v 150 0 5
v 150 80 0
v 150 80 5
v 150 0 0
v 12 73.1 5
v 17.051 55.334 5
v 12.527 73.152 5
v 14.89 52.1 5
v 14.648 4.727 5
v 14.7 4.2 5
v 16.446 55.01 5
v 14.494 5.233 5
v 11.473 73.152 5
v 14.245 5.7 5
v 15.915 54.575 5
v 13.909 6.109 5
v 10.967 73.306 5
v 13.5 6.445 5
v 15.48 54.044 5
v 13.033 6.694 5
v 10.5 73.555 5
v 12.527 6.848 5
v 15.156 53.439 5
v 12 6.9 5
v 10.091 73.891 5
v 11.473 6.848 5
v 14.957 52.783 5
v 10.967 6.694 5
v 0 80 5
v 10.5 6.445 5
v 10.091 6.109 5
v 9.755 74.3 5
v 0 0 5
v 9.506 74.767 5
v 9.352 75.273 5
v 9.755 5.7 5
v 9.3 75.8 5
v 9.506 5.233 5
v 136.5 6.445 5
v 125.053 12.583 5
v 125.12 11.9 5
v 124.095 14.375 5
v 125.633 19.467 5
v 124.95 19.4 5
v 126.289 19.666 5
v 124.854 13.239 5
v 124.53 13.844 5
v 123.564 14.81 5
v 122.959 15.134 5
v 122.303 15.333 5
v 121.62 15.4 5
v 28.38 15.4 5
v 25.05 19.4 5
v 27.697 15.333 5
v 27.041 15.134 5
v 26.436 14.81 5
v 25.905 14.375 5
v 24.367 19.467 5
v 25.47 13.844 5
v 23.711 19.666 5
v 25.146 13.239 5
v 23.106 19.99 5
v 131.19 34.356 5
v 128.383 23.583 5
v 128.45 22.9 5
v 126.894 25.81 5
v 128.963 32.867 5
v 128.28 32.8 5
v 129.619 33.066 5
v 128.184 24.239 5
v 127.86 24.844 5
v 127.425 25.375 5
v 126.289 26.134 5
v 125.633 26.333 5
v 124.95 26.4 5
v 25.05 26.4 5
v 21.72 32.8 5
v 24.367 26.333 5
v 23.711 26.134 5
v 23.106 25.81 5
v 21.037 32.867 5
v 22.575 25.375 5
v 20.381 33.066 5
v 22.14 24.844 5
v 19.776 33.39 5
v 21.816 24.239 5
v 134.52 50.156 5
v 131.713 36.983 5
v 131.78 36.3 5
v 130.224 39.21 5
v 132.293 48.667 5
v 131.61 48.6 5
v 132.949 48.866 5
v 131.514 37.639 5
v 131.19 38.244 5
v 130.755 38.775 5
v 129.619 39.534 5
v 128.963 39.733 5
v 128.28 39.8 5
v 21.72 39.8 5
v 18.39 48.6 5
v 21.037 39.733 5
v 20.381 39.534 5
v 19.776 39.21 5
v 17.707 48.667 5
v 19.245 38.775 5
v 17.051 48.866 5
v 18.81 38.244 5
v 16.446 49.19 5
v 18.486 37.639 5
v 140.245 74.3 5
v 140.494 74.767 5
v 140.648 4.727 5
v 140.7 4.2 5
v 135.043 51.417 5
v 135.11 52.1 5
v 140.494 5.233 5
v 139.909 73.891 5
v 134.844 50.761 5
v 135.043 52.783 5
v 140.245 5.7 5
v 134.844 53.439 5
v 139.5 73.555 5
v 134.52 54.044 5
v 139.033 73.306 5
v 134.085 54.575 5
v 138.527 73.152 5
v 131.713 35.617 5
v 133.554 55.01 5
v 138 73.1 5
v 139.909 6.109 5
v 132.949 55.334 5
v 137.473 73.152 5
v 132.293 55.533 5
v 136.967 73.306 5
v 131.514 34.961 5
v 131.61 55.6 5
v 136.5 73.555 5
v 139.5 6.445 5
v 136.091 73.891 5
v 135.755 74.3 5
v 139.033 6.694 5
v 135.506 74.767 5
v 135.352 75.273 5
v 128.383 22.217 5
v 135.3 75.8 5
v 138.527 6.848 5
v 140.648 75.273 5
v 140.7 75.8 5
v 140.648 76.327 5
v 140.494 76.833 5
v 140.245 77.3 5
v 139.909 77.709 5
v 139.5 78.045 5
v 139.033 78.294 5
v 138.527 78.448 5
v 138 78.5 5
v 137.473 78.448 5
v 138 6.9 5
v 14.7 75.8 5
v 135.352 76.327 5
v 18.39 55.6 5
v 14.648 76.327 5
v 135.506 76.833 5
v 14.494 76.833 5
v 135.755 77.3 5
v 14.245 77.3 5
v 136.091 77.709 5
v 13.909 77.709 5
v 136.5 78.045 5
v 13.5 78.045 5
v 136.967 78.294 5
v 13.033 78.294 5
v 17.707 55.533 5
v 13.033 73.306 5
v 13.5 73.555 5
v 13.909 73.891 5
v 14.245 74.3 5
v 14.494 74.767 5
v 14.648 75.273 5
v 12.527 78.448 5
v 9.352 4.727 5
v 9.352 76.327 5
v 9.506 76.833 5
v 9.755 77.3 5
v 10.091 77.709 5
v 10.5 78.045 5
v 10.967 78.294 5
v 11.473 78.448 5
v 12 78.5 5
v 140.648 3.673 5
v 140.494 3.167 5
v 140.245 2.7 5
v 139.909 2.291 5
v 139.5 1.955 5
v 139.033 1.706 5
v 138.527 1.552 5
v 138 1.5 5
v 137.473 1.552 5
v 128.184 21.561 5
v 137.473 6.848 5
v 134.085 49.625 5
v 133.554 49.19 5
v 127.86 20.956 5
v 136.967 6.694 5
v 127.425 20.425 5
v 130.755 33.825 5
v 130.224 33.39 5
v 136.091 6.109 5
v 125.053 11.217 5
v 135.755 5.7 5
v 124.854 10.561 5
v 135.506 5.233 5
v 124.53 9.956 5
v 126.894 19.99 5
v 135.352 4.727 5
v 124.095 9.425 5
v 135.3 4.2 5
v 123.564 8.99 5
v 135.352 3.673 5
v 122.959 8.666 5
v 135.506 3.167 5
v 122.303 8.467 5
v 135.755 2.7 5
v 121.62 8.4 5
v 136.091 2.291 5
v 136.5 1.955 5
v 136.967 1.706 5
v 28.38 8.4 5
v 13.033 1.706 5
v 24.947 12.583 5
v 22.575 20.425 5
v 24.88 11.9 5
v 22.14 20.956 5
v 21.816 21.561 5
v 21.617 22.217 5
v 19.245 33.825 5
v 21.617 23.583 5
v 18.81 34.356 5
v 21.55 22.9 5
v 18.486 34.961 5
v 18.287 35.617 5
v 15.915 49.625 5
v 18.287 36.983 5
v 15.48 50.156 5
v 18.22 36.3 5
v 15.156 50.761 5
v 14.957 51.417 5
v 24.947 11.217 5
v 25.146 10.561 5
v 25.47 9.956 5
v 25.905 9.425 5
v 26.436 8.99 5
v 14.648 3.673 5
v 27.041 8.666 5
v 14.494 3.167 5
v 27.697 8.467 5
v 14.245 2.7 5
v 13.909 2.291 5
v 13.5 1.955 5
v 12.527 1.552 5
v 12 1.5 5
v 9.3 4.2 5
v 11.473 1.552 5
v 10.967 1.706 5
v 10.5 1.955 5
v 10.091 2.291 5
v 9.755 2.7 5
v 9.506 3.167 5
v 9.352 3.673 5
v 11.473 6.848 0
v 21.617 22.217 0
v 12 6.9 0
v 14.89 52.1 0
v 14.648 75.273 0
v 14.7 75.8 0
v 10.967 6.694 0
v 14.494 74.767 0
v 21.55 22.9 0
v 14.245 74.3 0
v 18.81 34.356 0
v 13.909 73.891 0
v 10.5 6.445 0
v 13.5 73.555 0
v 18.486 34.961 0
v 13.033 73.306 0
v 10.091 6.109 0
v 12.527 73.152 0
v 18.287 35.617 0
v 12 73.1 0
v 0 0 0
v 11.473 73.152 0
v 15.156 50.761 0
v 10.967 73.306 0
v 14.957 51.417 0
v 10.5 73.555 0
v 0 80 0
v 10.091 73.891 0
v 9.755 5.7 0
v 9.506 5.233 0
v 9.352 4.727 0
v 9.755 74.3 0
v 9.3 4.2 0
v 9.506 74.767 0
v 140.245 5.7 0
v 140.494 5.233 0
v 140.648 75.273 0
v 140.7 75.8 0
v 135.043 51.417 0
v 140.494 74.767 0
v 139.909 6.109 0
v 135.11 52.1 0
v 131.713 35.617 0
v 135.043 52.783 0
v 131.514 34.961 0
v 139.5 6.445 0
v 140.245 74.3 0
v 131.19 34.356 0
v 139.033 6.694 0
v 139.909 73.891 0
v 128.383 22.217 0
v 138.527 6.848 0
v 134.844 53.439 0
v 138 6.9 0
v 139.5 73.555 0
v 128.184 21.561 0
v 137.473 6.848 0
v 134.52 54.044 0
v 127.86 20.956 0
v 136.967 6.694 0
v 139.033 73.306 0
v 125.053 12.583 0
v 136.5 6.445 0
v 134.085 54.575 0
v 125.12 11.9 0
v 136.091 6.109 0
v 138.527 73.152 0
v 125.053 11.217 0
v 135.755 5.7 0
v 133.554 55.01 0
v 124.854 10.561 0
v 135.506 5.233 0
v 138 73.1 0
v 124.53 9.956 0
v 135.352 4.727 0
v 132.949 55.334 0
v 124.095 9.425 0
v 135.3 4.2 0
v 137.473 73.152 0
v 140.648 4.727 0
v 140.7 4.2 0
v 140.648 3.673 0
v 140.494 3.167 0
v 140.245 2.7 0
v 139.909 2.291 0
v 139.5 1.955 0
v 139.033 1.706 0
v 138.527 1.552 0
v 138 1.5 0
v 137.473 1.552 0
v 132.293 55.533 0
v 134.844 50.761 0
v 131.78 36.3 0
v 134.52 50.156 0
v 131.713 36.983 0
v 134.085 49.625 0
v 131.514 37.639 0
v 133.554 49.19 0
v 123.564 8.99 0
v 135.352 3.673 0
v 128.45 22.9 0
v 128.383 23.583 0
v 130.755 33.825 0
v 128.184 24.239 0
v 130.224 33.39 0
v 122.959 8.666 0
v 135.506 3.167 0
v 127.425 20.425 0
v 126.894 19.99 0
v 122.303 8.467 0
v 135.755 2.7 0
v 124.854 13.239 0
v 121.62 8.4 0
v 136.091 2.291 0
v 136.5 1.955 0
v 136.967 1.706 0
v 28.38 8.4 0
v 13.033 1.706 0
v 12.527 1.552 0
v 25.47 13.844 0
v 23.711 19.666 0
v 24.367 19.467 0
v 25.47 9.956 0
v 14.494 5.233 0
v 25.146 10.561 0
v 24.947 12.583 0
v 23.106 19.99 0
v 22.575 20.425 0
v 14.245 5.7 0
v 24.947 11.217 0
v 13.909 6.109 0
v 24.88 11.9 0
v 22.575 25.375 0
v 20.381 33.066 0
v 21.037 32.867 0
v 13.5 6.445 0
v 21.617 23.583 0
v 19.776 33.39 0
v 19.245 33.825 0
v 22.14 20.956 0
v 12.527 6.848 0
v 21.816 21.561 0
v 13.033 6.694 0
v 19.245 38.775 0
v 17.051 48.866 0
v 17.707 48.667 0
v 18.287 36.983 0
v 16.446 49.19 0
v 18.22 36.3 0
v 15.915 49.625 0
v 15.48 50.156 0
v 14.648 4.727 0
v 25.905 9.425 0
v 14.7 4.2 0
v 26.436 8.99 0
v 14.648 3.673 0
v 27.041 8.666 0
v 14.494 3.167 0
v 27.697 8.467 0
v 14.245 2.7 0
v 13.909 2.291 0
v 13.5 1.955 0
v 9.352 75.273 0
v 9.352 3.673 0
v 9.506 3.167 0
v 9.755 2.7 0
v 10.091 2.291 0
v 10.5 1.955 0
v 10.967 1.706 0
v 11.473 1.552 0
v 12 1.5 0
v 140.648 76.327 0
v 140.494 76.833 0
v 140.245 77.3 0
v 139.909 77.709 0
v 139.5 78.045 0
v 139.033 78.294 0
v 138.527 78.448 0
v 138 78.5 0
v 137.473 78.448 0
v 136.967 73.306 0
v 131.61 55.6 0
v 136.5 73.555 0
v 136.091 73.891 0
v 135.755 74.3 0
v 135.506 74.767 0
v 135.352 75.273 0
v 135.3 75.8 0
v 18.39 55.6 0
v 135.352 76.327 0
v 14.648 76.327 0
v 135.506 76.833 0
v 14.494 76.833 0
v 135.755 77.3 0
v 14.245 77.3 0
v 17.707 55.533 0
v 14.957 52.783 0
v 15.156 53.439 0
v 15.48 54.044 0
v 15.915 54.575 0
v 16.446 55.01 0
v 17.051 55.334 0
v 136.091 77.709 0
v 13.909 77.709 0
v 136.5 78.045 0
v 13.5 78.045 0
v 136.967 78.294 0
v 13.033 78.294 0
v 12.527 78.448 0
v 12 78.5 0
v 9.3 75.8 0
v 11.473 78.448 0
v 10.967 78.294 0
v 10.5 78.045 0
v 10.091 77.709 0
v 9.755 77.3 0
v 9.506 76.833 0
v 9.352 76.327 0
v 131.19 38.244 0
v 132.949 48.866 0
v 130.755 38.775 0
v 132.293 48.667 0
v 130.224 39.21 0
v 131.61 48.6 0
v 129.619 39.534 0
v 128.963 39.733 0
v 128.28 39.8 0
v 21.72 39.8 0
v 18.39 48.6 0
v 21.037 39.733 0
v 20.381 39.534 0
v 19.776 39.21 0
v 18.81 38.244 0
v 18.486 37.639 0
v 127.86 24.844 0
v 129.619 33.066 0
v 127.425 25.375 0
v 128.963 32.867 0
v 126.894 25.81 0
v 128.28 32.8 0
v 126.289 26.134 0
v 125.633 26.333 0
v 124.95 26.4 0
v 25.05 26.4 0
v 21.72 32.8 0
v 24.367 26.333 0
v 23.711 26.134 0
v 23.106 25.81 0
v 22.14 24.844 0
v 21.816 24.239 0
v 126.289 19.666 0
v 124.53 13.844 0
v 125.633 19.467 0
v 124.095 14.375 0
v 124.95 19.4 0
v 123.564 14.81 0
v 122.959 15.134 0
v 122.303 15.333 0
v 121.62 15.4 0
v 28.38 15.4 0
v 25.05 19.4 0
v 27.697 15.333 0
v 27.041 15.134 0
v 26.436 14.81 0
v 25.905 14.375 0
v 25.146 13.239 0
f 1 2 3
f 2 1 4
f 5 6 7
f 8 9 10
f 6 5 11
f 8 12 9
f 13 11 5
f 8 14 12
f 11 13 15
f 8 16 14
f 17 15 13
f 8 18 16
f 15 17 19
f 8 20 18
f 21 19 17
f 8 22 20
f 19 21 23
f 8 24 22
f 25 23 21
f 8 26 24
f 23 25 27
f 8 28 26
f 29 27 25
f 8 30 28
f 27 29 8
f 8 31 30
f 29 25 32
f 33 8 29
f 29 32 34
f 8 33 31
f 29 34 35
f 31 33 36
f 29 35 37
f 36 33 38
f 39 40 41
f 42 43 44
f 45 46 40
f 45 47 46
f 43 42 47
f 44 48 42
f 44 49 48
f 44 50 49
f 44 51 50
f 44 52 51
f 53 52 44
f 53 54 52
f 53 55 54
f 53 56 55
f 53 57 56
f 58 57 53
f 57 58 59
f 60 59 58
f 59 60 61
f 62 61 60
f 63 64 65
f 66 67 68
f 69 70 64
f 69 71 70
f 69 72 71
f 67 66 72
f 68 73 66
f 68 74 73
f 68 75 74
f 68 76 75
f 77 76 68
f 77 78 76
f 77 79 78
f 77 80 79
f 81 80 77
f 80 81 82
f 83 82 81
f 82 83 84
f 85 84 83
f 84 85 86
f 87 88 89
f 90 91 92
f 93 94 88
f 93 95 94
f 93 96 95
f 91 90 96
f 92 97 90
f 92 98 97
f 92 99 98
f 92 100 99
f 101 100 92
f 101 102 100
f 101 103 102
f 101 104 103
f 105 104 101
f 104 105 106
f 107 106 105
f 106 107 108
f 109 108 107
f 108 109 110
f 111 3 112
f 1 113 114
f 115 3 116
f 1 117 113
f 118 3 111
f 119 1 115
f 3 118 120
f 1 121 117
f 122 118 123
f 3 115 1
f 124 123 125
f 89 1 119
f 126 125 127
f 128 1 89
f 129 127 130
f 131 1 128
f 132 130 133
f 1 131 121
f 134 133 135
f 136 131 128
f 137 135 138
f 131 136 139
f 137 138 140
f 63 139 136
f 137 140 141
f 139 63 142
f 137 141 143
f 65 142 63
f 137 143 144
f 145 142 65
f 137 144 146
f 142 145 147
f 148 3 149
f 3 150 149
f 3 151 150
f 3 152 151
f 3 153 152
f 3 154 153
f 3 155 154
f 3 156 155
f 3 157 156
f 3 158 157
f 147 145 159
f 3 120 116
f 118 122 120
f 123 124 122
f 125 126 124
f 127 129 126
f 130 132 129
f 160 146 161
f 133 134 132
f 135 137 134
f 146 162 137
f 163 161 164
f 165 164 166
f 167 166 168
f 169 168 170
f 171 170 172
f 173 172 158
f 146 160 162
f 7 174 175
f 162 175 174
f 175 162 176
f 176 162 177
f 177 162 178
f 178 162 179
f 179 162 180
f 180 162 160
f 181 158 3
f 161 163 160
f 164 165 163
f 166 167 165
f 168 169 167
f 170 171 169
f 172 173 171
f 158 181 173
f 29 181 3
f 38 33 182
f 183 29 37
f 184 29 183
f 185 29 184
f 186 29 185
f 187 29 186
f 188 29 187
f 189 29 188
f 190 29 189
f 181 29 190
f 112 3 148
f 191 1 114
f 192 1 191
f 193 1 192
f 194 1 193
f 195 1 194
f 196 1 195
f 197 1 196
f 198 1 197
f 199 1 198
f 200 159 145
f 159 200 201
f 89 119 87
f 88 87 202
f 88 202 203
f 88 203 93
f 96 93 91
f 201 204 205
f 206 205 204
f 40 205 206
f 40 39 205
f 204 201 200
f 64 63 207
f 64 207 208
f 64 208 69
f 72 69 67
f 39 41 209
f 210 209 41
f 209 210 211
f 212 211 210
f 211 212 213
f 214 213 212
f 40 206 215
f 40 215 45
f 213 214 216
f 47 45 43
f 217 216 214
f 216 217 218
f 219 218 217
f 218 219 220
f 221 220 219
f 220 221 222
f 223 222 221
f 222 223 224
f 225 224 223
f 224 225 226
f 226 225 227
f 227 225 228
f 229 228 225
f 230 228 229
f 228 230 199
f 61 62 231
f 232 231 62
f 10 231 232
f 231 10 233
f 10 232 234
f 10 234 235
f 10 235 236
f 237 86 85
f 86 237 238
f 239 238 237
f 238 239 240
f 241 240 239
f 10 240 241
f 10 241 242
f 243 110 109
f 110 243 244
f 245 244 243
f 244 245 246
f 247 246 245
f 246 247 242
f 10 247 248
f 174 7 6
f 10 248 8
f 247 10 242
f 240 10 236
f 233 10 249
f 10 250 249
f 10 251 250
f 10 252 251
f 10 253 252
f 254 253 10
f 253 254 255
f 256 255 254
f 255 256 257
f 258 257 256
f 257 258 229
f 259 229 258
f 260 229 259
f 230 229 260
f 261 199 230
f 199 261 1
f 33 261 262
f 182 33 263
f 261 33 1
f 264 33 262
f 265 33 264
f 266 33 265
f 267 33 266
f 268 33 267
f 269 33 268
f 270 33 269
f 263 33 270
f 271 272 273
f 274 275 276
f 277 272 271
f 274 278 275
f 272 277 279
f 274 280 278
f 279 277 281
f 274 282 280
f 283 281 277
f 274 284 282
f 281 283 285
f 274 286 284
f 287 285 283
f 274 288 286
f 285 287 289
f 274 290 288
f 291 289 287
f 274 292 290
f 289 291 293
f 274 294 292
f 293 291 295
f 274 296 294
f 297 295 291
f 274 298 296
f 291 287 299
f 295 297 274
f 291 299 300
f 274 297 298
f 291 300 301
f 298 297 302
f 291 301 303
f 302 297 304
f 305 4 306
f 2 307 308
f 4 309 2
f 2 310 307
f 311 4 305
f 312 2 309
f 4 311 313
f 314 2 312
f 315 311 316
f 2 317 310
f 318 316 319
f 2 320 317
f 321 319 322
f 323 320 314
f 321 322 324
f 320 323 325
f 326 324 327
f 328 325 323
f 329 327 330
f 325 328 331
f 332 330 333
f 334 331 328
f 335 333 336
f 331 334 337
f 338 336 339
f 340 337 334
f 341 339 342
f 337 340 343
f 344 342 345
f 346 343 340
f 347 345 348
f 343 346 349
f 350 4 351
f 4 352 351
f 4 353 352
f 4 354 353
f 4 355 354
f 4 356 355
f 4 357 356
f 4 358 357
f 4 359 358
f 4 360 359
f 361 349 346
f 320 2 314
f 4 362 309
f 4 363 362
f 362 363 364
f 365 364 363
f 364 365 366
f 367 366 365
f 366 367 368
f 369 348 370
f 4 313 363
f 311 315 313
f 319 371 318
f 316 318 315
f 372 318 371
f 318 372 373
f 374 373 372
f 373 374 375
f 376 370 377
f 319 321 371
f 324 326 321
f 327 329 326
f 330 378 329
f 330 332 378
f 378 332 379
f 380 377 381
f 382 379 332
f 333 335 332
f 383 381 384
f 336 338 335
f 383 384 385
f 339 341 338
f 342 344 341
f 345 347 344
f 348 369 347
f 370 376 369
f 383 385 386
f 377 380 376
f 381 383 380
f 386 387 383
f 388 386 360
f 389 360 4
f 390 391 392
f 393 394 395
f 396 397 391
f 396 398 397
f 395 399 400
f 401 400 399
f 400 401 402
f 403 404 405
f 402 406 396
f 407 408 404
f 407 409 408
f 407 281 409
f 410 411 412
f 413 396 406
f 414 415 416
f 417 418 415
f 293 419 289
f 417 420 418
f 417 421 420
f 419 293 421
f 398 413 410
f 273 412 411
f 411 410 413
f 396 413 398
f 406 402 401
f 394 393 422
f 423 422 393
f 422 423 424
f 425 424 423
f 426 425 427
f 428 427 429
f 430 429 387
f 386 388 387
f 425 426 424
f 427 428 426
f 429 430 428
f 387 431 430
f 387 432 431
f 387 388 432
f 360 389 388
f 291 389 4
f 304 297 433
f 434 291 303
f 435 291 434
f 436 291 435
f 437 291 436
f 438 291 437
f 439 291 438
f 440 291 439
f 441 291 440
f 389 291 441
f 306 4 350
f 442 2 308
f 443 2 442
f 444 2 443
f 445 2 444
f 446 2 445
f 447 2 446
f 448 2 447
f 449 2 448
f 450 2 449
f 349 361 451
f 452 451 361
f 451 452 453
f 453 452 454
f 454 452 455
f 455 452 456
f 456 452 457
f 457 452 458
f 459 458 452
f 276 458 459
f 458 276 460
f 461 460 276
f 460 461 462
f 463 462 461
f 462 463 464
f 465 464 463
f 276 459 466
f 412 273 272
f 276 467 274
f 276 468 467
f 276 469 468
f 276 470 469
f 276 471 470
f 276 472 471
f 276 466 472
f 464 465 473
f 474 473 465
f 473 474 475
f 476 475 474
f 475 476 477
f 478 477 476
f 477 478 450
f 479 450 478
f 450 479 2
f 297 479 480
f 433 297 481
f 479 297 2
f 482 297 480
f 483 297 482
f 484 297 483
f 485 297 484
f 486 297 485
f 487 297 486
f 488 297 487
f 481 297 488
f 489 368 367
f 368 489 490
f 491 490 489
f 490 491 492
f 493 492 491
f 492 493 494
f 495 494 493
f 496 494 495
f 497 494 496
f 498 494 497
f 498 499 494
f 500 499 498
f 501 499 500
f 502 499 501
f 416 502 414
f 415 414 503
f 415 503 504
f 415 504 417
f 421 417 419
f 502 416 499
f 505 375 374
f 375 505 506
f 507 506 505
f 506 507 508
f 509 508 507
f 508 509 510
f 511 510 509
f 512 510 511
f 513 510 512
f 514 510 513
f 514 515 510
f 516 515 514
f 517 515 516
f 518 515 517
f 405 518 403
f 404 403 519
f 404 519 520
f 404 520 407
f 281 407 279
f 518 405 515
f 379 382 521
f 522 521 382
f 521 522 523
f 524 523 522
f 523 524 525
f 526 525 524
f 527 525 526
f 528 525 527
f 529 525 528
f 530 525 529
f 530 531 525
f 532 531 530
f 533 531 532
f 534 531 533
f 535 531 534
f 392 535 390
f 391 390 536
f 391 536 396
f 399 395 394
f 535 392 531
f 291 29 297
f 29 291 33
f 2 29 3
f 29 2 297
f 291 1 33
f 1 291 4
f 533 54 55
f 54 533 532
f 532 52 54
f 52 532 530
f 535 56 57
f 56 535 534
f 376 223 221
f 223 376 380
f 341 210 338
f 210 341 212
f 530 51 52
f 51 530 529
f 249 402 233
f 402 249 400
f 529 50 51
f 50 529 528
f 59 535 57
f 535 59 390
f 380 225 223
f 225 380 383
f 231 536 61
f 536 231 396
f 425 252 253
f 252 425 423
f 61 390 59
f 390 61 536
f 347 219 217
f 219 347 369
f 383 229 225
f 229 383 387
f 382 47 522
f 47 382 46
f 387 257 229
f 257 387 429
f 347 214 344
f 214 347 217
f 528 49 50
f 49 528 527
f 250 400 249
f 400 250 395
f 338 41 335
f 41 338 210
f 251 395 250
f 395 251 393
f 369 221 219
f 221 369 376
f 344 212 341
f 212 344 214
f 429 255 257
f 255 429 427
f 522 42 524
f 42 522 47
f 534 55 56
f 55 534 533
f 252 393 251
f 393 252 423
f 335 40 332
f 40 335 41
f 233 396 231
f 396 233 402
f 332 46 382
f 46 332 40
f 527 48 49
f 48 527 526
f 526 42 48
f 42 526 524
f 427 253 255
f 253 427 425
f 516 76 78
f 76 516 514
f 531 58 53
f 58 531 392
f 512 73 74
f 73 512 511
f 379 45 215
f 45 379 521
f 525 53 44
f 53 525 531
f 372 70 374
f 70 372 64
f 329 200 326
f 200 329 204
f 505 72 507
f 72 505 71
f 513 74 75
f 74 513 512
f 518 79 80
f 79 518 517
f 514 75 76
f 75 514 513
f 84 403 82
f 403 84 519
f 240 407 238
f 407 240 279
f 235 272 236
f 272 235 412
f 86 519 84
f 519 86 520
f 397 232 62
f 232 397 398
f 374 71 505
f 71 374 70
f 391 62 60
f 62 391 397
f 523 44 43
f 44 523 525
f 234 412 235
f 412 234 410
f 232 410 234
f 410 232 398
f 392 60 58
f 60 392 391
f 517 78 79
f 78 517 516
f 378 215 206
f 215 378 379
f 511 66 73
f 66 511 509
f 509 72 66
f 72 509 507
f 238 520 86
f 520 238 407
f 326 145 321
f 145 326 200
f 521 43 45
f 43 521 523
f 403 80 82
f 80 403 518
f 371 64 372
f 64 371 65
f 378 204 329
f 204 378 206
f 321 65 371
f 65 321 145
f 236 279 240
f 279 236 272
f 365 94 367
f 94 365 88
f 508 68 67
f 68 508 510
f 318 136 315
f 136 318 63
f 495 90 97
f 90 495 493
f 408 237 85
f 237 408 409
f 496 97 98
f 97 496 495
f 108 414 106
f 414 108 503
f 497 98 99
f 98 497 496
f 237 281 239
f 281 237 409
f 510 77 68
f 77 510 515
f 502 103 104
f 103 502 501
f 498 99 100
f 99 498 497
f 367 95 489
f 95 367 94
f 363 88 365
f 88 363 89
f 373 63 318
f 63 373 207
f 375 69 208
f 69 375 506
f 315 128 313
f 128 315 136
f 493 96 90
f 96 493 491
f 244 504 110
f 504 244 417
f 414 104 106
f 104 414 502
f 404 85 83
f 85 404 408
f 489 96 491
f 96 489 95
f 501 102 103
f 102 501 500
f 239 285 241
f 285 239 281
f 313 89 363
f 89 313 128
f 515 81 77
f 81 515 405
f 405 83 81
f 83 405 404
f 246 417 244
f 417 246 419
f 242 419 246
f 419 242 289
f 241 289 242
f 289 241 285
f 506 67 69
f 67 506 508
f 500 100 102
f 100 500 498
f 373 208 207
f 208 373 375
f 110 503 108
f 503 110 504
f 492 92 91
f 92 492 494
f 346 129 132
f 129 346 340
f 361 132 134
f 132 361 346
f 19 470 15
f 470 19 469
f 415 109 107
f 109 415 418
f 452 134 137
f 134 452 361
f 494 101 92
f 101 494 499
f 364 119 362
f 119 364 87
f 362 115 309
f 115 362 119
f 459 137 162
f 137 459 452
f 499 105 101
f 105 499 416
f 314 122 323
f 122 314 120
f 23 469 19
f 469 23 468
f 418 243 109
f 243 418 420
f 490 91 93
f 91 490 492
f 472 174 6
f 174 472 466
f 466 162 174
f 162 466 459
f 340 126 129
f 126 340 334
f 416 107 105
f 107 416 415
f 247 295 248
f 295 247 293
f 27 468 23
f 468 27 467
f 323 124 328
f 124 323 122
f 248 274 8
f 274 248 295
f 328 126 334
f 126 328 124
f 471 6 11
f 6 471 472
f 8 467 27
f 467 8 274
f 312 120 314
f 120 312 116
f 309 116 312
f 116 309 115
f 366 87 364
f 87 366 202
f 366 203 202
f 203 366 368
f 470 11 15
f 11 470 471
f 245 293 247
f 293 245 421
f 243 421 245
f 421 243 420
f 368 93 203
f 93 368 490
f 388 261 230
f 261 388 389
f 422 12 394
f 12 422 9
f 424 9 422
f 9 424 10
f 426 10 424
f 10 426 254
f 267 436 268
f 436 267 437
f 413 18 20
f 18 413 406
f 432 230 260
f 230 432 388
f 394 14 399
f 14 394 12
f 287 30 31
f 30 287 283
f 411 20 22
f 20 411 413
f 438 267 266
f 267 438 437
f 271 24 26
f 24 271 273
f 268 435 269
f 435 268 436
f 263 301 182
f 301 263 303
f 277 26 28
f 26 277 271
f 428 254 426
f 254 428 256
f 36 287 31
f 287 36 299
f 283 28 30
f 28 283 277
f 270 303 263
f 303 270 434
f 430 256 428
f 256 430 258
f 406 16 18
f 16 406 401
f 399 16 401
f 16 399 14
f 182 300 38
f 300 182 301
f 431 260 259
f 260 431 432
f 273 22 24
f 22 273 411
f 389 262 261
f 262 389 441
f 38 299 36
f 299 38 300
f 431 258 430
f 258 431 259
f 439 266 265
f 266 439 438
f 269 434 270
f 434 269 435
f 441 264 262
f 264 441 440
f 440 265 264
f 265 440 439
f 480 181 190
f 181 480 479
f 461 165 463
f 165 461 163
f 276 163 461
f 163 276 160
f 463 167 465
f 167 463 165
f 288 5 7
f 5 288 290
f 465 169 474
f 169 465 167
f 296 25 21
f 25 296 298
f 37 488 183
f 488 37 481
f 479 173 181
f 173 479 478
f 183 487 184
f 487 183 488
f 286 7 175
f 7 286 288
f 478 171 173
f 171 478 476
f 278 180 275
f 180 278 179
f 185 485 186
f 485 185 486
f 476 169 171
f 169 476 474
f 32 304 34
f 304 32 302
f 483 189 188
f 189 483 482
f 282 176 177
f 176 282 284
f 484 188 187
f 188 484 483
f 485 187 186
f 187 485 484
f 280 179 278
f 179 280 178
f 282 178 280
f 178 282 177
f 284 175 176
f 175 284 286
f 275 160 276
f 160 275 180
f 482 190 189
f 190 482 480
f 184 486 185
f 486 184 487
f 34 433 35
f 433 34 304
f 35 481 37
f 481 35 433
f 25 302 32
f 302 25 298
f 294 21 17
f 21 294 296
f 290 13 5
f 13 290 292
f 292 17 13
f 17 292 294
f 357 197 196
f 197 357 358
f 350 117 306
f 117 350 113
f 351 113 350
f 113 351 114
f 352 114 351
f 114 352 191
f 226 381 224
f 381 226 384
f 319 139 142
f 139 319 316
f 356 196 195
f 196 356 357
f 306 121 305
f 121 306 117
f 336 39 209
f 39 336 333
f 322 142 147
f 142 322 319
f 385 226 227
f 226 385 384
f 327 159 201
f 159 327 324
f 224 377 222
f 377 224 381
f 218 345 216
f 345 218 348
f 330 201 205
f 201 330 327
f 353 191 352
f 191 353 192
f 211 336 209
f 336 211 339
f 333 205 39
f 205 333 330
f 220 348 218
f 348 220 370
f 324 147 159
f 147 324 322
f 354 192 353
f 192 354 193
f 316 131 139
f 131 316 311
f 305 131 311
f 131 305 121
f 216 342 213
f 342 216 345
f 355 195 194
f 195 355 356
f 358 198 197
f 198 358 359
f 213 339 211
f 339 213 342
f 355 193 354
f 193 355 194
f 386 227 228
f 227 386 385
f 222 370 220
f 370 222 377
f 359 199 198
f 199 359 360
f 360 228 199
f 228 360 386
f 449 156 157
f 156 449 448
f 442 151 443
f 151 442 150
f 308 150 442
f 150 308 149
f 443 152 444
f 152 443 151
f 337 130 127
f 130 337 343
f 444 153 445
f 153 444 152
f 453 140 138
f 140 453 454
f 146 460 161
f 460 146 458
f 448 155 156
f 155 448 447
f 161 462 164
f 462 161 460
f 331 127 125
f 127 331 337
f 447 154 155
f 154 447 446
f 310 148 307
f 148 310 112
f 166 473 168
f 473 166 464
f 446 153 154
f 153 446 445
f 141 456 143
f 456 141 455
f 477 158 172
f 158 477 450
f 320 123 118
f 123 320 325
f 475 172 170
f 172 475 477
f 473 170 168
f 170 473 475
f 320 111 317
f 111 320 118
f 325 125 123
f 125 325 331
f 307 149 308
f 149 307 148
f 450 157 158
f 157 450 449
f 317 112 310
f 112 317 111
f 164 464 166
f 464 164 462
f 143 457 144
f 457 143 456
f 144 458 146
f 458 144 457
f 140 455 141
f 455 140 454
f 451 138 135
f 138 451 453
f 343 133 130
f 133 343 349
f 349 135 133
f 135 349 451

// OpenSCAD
$fn = 32;

// ----------------------------------------------------------------------
// Slotted panel: 150 x 80 mm, 4 ряда of slots
// ----------------------------------------------------------------------

// --- parameters (mm) ---
panel_w = 150;            // panel width
panel_d = 80;             // panel depth
thick = 5;                // panel thickness
slot_w = 7;               // slot width
pitch0 = 11;              // first row pitch
pitch_step = 2.4;         // pitch increase per row
margin = 8.4;             // margin around the slot field
rows = 4;                 // number of slot rows
mount_d = 5.4;            // mounting holes
mount_x = 63;             // mounting hole offset

difference() {
  union() {
    cube([panel_w, panel_d, thick]);
  }
  /* slot rows: stadium shaped cutters, 2.5 mm clear of both faces */
  /* row 0: pitch 11, length 93.24 */
  hull() {
    translate([28.38, 11.9, -2.5]) cylinder(h = thick + 5, d = slot_w);
    translate([121.62, 11.9, -2.5]) cylinder(h = thick + 5, d = slot_w);
  }
  /* row 1: pitch 13.4, length 99.9 */
  hull() {
    translate([25.05, 22.9, -2.5]) cylinder(h = thick + 5, d = slot_w);
    translate([124.95, 22.9, -2.5]) cylinder(h = thick + 5, d = slot_w);
  }
  /* row 2: pitch 15.8, length 106.56 */
  hull() {
    translate([21.72, 36.3, -2.5]) cylinder(h = thick + 5, d = slot_w);
    translate([128.28, 36.3, -2.5]) cylinder(h = thick + 5, d = slot_w);
  }
  /* row 3: pitch 18.2, length 113.22 */
  hull() {
    translate([18.39, 52.1, -2.5]) cylinder(h = thick + 5, d = slot_w);
    translate([131.61, 52.1, -2.5]) cylinder(h = thick + 5, d = slot_w);
  }
  translate([12, 4.2, -2.5]) cylinder(h = 10, d = mount_d);
  translate([12, 75.8, -2.5]) cylinder(h = 10, d = mount_d);
  translate([138, 4.2, -2.5]) cylinder(h = 10, d = mount_d);
  translate([138, 75.8, -2.5]) cylinder(h = 10, d = mount_d);
}
